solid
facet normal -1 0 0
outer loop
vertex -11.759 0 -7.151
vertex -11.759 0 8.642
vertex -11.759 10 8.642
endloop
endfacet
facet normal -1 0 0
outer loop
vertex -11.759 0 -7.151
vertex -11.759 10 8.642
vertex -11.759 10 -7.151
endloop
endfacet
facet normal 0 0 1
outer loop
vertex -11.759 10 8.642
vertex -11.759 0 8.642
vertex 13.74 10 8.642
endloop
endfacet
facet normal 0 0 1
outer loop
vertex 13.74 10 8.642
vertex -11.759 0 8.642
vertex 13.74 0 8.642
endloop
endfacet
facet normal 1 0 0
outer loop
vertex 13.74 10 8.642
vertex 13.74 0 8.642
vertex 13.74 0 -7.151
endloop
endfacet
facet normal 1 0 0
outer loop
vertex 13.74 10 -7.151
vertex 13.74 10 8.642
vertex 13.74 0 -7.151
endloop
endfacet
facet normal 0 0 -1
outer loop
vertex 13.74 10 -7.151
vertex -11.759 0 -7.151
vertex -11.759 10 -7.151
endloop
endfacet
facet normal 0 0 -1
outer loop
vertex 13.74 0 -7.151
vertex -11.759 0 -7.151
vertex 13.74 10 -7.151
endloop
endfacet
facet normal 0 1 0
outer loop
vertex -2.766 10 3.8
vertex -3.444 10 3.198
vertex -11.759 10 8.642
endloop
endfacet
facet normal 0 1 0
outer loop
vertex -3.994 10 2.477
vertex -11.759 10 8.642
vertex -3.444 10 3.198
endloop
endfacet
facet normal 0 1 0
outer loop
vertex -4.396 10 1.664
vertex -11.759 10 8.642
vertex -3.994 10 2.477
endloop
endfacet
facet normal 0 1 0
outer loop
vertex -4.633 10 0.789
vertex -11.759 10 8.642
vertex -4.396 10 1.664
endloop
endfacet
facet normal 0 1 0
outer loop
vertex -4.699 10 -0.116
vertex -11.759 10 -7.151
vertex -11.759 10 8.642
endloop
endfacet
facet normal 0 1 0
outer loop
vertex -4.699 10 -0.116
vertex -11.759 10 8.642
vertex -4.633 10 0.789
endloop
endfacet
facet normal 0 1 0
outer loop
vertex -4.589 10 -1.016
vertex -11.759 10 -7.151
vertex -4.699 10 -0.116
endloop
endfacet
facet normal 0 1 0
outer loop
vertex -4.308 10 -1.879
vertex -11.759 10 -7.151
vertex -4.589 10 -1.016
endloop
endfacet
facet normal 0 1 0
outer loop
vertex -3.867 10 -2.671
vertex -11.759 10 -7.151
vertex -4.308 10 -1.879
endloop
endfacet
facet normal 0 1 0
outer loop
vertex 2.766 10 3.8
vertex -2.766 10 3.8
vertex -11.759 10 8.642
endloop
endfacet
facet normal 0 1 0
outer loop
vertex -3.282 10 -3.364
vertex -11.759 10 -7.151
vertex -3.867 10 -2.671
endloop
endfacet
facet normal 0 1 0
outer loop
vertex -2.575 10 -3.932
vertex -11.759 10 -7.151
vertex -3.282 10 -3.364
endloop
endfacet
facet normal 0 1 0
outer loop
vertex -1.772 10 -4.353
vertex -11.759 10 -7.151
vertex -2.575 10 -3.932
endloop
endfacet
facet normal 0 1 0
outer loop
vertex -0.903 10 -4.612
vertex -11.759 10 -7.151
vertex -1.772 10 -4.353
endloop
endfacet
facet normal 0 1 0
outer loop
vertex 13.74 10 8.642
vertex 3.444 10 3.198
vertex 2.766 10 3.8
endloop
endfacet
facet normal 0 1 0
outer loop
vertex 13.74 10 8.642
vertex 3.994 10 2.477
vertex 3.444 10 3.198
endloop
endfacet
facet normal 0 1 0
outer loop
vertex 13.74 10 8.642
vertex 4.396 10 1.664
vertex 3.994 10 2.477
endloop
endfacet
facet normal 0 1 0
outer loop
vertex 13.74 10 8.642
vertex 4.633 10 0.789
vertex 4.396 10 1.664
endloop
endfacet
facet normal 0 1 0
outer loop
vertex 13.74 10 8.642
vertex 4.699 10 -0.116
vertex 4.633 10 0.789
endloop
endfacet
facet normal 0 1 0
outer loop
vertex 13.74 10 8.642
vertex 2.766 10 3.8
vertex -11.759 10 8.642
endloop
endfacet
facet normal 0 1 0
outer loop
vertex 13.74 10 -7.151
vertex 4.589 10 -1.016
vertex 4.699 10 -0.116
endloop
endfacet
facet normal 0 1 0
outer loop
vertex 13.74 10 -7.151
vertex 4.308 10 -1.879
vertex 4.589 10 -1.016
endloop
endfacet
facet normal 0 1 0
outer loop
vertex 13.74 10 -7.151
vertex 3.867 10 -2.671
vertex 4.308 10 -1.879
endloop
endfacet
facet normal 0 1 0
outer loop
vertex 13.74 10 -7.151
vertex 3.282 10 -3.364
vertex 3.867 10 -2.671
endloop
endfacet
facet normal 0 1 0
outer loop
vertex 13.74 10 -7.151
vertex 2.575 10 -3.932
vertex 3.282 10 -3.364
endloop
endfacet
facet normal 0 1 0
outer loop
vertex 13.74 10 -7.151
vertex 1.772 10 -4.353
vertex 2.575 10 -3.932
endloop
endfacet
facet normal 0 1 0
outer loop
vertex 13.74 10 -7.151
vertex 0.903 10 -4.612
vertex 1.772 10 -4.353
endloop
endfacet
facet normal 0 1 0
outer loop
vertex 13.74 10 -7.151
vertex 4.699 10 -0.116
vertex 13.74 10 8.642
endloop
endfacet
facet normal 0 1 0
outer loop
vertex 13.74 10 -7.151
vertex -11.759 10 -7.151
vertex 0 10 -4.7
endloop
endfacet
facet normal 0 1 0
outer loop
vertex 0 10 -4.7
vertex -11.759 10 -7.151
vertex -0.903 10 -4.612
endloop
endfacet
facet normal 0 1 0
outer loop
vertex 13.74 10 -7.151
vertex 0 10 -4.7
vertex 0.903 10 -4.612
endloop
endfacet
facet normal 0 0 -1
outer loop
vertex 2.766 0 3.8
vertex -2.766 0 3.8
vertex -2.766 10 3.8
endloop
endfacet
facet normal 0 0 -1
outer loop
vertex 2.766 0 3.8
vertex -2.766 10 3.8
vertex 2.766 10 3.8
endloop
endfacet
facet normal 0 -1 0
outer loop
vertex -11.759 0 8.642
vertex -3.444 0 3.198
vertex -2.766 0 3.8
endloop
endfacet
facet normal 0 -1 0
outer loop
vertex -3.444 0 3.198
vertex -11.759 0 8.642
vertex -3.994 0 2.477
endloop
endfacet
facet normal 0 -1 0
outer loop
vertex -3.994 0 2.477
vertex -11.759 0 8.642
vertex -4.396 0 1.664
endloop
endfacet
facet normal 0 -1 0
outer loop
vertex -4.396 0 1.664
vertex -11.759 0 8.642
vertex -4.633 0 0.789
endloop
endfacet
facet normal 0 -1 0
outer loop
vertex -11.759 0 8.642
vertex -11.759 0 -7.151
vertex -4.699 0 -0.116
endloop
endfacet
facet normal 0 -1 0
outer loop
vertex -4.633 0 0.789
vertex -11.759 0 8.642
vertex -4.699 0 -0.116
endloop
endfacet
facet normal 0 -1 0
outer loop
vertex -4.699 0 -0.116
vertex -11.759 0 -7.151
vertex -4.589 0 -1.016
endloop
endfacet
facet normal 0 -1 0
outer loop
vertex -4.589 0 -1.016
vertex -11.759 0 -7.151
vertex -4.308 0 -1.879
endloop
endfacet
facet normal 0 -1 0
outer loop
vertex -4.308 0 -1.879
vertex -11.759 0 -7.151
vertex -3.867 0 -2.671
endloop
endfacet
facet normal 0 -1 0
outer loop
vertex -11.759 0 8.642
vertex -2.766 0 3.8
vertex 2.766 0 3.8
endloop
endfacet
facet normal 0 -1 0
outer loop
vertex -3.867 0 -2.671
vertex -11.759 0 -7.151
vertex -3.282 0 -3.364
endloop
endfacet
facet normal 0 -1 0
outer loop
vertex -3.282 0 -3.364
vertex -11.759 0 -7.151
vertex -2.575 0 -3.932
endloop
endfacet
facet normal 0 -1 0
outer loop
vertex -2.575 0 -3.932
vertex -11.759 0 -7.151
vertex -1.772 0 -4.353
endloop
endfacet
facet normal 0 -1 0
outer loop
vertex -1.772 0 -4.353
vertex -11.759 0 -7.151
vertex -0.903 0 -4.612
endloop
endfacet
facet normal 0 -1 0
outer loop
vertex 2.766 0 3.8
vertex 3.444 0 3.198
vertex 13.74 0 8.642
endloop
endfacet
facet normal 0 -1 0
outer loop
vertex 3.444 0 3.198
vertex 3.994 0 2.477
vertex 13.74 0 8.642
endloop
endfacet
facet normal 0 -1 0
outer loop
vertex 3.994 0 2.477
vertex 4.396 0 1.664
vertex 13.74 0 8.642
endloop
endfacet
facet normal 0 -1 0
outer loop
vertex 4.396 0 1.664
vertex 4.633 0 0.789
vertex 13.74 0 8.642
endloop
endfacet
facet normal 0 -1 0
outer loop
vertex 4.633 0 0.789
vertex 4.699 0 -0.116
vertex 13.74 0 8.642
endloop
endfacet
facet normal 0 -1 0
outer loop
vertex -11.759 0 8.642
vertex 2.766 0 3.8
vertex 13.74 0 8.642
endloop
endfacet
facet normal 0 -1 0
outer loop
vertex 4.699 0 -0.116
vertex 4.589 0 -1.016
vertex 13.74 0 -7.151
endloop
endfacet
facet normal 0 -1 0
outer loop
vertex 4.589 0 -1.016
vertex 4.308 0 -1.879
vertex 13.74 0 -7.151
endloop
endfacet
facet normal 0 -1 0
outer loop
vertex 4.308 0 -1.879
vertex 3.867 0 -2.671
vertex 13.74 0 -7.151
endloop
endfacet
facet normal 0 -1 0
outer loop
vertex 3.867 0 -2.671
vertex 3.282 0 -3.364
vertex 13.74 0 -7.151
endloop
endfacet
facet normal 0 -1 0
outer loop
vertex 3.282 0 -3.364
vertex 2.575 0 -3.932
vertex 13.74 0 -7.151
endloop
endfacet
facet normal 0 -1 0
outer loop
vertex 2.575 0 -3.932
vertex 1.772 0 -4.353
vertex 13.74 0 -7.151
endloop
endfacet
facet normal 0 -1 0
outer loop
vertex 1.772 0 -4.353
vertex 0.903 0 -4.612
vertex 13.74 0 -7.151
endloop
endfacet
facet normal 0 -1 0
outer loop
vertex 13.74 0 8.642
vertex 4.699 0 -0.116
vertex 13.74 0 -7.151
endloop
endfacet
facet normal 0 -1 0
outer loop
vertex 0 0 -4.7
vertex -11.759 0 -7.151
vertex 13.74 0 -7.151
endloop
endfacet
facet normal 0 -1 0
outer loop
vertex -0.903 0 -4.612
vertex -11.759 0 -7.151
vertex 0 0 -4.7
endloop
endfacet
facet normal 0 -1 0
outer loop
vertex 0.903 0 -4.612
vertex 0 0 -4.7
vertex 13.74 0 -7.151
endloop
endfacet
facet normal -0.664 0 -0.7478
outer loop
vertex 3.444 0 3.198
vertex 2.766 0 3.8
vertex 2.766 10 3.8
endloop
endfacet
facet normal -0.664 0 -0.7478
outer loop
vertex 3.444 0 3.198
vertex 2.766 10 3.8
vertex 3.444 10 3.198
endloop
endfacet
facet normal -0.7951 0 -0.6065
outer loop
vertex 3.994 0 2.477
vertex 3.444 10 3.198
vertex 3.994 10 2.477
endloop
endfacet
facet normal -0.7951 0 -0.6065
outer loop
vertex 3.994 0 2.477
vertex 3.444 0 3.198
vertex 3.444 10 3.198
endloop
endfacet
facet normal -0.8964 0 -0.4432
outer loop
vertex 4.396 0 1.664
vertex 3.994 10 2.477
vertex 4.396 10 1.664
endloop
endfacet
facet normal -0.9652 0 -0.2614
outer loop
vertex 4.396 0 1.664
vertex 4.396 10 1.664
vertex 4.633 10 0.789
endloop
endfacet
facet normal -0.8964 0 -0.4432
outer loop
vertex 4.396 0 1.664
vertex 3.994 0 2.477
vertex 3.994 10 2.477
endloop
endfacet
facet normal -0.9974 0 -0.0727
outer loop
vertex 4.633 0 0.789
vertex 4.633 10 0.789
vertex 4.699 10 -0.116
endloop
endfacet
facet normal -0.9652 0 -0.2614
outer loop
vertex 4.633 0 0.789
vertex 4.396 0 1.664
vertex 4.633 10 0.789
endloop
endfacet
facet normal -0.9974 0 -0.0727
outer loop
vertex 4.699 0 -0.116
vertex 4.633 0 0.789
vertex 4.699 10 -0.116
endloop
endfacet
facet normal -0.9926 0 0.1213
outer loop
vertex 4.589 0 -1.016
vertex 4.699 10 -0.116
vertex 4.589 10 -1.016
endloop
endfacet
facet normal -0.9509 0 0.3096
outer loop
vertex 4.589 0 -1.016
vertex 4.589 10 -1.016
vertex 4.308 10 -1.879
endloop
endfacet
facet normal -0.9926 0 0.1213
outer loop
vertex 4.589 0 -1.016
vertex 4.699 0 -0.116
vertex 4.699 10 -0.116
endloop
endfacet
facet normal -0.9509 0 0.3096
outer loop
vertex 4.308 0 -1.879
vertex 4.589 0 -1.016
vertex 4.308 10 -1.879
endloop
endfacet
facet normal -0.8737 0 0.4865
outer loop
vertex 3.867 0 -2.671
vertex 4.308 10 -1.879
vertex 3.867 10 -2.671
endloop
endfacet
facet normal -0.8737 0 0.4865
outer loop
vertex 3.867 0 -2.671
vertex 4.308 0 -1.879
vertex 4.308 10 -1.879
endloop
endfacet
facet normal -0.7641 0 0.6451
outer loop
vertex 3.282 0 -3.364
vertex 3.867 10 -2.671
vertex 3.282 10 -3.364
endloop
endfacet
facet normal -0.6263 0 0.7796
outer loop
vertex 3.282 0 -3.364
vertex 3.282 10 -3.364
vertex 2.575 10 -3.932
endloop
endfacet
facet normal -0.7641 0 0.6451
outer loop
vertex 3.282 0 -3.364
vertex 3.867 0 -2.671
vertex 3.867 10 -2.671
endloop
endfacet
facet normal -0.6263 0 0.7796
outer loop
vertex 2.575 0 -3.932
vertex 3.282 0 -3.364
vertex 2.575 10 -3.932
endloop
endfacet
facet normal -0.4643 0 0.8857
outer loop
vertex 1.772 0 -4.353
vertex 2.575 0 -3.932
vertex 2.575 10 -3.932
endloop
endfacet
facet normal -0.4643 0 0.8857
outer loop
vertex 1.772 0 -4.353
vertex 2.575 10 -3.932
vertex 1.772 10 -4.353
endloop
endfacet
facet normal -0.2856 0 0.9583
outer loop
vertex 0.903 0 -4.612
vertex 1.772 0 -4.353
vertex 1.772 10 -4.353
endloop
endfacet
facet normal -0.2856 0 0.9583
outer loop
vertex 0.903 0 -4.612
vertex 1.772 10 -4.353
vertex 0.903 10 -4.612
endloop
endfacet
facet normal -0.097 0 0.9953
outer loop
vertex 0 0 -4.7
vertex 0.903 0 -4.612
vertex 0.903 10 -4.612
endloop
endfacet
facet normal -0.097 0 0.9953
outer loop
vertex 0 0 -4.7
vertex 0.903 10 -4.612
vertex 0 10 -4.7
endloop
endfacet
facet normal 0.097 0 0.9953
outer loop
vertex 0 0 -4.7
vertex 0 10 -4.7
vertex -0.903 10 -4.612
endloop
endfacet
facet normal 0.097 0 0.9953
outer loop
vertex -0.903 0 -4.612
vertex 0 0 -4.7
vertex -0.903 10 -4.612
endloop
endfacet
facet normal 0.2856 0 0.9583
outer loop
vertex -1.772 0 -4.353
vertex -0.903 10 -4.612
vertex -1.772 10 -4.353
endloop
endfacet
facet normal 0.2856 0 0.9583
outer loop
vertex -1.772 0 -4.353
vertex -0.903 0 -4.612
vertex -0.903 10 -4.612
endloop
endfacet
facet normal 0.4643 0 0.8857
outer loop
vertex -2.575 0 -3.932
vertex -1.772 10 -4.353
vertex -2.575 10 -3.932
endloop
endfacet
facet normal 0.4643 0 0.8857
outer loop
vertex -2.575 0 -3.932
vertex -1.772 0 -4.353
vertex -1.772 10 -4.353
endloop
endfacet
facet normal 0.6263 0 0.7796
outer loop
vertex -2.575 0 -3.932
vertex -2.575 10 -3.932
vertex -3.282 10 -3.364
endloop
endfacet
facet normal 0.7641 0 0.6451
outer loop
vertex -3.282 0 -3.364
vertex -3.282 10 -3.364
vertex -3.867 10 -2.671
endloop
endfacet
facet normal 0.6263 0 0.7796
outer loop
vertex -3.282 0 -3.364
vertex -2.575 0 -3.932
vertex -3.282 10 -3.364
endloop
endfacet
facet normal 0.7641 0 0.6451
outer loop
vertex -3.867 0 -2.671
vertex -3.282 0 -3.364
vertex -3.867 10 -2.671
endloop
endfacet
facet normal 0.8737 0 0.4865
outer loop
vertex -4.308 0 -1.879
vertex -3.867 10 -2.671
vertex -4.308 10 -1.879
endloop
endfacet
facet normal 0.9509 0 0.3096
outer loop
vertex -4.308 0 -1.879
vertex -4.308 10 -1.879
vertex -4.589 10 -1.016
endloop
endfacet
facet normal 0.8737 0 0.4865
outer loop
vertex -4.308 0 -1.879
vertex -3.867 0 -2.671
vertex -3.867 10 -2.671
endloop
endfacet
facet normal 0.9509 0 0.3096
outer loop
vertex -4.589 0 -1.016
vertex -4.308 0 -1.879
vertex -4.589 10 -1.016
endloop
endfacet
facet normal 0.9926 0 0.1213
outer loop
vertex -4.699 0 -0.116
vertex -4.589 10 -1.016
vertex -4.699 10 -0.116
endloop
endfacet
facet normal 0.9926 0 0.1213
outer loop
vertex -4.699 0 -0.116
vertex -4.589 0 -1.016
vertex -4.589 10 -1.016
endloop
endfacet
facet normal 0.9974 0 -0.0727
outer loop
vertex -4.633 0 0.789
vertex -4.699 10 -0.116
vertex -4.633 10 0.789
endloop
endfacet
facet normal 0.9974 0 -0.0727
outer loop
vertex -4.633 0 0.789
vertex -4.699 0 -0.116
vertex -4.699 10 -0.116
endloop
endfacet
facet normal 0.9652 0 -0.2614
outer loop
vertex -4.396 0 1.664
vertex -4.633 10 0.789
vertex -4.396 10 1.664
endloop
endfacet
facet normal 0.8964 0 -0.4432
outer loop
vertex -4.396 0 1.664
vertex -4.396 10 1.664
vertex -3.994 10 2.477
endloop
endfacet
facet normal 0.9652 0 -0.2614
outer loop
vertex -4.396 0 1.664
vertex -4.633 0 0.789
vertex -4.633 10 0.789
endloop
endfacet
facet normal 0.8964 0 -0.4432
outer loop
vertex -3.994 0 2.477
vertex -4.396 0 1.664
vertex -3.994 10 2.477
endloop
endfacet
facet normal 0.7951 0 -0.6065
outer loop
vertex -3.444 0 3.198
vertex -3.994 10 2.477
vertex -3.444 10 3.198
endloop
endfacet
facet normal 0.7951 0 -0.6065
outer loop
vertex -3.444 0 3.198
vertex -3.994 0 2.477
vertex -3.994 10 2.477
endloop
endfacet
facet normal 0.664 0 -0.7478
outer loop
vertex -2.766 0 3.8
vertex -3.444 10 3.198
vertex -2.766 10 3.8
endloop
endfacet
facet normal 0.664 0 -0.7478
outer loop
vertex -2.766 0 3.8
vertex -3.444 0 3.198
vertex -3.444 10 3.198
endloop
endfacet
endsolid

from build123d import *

# Parameters (mm, degrees)
SKETCH1_W           = 25.499374977
SKETCH1_H           = 15.79332804
BOSS_EXTRUDE1_DEPTH = 10


with BuildPart() as part:
    # Sketch1 → Boss-Extrude1 (new body)
    with BuildSketch(Plane(origin=(0, 0, 0), x_dir=(1, 0, 0), z_dir=(0, 1, 0))):
        with Locations((0.990737135, -0.745657883)):
            Rectangle(SKETCH1_W, SKETCH1_H)
        with BuildLine():
            Line((-2.765863337, -3.8), (2.765863337, -3.8))
            ThreePointArc((2.765863337, -3.8), (0, 4.7), (-2.765863337, -3.8))
        make_face(mode=Mode.SUBTRACT)
    extrude(amount=BOSS_EXTRUDE1_DEPTH)


solid = part.part
